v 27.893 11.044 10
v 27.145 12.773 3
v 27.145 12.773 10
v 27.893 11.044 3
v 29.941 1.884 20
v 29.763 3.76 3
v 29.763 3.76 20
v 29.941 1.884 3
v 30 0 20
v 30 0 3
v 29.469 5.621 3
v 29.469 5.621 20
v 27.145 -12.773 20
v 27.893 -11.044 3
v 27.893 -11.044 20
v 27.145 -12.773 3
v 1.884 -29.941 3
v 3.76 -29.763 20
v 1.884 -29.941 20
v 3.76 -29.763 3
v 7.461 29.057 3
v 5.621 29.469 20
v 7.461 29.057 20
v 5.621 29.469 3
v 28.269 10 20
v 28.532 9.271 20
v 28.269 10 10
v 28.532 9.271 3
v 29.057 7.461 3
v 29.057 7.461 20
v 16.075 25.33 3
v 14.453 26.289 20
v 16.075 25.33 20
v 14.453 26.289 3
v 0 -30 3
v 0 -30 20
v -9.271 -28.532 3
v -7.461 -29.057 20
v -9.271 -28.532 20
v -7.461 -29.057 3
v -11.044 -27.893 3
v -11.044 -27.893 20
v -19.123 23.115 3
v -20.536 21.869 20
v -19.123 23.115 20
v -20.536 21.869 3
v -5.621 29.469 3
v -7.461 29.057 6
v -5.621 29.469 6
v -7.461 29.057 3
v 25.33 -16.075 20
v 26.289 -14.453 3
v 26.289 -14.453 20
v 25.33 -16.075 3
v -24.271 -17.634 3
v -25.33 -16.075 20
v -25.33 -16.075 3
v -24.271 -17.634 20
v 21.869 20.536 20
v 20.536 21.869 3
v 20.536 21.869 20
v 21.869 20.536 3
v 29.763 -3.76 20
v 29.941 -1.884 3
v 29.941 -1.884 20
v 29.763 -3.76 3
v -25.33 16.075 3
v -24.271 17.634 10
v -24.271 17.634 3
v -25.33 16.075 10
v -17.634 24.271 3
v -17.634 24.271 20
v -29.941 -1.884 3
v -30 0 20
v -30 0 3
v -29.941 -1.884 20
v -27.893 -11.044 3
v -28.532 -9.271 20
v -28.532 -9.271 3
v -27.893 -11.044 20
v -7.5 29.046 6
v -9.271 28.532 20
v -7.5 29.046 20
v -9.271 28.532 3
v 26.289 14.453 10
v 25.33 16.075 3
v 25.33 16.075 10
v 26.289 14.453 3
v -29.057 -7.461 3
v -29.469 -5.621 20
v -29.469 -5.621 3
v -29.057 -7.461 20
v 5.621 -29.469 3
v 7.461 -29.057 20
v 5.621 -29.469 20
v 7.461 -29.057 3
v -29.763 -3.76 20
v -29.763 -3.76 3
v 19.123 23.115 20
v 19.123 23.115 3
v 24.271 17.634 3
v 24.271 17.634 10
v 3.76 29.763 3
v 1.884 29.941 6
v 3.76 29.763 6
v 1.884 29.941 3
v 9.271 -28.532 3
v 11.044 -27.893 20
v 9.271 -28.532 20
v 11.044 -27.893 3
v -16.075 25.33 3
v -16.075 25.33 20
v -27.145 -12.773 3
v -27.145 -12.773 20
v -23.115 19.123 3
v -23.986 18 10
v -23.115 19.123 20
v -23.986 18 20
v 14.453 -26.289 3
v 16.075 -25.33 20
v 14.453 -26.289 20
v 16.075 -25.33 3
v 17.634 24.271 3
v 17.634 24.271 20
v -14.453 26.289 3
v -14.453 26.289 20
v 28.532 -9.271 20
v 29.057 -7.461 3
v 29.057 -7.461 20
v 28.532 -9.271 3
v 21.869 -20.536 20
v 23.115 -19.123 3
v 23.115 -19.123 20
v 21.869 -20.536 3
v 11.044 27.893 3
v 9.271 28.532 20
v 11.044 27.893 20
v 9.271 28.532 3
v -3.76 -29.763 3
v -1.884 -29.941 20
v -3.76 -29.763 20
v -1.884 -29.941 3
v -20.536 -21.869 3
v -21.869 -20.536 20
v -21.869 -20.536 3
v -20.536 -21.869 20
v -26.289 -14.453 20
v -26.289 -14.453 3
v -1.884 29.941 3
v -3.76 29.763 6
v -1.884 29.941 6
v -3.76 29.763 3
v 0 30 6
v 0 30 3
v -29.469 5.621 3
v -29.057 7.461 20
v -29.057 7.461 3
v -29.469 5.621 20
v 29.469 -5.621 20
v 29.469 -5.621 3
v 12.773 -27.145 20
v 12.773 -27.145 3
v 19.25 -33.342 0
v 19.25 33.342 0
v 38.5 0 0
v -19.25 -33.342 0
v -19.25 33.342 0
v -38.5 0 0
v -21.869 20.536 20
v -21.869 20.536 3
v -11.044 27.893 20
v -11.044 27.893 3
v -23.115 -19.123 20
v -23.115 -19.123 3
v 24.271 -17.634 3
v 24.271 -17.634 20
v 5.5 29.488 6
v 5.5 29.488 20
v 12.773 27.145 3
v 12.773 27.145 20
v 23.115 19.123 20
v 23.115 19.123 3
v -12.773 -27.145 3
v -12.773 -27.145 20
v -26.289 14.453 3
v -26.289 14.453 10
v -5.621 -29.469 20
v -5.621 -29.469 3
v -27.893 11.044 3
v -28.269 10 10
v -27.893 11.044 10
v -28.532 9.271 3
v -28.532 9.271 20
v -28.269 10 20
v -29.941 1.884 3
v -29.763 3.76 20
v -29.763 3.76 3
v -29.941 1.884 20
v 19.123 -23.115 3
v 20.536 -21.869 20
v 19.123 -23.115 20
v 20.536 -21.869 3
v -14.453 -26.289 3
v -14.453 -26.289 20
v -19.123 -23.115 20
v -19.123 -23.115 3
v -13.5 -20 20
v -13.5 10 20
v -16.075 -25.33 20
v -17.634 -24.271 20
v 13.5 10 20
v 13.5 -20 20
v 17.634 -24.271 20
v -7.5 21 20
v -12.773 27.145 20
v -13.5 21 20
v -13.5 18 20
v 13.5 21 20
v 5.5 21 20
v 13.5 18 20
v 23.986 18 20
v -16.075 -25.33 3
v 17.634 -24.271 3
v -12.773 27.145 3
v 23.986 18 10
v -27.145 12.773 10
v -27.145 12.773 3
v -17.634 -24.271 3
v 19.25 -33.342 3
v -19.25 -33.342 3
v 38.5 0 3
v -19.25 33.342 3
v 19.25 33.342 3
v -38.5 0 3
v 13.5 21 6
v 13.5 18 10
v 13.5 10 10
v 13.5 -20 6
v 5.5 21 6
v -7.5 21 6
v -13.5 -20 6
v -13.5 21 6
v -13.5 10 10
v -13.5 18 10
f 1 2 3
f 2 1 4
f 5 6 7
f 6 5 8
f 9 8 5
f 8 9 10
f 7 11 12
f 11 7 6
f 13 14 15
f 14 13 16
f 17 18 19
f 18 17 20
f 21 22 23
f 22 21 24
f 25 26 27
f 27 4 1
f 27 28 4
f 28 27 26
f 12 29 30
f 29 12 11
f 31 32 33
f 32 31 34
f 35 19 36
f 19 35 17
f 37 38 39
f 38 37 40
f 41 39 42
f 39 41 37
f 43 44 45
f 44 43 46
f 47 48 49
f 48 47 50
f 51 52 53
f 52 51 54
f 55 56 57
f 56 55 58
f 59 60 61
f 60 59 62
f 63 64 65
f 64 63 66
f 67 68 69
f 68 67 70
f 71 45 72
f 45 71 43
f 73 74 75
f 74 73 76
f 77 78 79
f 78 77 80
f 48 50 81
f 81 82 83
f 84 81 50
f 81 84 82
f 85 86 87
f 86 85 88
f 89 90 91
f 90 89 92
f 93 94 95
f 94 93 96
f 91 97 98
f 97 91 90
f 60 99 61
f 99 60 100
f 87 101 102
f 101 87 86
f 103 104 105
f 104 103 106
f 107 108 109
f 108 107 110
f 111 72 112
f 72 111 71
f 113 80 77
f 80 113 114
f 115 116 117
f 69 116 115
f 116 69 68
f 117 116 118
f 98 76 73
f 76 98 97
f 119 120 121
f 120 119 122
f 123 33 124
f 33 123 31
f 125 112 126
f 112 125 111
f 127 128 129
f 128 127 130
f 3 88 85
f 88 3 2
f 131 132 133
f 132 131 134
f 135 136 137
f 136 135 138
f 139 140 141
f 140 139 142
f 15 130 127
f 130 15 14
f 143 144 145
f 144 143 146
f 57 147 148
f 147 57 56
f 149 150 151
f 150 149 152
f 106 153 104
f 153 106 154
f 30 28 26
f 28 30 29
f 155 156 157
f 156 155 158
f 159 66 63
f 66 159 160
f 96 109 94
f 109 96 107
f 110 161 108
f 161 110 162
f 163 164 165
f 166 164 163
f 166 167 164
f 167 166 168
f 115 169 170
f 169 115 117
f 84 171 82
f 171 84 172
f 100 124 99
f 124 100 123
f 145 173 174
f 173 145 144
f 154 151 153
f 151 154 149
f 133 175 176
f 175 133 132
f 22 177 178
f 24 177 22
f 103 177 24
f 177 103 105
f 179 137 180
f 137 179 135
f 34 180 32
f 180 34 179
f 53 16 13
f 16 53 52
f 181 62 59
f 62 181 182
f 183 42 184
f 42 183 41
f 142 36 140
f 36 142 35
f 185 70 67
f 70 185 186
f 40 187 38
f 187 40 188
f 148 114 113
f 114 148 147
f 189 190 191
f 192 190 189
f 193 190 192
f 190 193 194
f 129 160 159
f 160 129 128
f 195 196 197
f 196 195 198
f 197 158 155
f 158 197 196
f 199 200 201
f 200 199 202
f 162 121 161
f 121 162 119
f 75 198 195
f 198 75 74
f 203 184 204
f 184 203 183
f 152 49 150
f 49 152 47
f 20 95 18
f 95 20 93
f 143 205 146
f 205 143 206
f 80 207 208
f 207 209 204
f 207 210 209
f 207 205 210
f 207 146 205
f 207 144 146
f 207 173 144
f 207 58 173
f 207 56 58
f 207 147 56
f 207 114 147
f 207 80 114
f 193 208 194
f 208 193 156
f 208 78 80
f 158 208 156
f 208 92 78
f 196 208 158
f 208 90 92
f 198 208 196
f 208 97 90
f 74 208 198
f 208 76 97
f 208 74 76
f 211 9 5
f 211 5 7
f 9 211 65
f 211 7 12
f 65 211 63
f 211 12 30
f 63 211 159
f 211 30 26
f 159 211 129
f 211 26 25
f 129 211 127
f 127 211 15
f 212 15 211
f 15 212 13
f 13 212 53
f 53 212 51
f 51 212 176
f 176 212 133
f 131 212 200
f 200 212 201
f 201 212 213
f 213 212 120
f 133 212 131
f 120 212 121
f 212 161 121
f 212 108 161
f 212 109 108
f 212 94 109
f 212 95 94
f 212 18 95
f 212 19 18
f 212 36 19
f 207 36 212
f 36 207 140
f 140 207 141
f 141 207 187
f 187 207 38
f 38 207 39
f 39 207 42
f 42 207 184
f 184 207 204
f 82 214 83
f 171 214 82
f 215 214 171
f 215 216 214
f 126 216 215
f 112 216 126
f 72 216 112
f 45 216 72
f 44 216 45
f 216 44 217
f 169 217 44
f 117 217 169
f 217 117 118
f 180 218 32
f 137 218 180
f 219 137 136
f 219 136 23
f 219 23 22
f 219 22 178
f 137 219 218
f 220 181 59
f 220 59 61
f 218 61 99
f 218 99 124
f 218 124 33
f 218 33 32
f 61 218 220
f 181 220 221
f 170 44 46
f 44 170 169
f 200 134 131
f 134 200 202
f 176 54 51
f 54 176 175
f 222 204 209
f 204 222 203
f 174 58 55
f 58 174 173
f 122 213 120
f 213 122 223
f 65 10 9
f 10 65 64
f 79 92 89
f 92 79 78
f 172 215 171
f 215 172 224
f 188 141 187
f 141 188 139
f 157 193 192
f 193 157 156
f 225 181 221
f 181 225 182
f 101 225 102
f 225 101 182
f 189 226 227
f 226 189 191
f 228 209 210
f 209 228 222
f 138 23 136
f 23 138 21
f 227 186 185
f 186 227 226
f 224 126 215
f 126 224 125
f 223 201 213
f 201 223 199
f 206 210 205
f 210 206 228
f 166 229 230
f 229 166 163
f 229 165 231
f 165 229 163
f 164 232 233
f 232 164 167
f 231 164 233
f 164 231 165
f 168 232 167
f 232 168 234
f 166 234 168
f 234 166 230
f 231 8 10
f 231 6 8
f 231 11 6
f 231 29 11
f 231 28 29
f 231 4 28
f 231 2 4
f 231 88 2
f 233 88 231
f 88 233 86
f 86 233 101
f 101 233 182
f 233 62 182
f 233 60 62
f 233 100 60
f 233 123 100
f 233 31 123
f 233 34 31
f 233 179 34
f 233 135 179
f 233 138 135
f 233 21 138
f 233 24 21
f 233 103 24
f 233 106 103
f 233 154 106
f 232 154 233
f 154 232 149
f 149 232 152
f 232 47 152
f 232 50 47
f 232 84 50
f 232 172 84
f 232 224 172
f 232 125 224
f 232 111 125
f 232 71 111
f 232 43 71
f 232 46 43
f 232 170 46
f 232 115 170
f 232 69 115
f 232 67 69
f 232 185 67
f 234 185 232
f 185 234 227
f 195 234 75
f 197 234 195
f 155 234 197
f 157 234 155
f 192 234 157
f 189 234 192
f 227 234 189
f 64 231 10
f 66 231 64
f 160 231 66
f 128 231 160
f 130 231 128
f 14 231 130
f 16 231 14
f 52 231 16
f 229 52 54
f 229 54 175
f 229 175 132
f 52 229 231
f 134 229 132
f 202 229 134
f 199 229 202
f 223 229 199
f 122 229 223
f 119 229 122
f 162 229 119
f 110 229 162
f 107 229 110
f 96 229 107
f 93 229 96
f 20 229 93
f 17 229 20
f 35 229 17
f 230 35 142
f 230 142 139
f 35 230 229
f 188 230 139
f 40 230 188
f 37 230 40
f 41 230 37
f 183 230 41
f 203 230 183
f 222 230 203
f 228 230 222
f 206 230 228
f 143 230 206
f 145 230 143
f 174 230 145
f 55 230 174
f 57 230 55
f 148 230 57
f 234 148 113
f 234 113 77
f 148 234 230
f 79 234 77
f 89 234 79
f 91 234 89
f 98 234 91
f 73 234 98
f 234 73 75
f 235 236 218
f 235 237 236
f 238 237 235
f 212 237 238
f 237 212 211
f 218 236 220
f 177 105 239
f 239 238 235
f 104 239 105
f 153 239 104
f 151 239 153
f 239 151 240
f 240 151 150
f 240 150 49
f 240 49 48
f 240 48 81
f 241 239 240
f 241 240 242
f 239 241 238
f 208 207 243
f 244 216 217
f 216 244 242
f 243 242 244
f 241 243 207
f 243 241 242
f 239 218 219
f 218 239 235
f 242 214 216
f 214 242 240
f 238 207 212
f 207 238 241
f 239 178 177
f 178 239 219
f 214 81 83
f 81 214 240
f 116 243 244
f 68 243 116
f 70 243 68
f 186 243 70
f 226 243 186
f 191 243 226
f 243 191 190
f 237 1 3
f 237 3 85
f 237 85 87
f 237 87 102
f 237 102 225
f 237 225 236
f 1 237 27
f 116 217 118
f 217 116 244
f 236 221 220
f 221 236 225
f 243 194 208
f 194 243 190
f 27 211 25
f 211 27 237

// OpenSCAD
difference(){
    
    union(){
     
        cylinder(r=30, h=20,$fn=100);
        translate([0,0,0])
        cylinder(r=38.5, h=3, $fn=6);
    }
    translate([-13.5,-20,6])
    cube([27,41,36]);

    translate([-7.5,20,6])
    cube([13,30,26]);
    
    translate([-60,10,10])
    cube([100,8,30]);
}






//cube([1.3,0.5,3]);
